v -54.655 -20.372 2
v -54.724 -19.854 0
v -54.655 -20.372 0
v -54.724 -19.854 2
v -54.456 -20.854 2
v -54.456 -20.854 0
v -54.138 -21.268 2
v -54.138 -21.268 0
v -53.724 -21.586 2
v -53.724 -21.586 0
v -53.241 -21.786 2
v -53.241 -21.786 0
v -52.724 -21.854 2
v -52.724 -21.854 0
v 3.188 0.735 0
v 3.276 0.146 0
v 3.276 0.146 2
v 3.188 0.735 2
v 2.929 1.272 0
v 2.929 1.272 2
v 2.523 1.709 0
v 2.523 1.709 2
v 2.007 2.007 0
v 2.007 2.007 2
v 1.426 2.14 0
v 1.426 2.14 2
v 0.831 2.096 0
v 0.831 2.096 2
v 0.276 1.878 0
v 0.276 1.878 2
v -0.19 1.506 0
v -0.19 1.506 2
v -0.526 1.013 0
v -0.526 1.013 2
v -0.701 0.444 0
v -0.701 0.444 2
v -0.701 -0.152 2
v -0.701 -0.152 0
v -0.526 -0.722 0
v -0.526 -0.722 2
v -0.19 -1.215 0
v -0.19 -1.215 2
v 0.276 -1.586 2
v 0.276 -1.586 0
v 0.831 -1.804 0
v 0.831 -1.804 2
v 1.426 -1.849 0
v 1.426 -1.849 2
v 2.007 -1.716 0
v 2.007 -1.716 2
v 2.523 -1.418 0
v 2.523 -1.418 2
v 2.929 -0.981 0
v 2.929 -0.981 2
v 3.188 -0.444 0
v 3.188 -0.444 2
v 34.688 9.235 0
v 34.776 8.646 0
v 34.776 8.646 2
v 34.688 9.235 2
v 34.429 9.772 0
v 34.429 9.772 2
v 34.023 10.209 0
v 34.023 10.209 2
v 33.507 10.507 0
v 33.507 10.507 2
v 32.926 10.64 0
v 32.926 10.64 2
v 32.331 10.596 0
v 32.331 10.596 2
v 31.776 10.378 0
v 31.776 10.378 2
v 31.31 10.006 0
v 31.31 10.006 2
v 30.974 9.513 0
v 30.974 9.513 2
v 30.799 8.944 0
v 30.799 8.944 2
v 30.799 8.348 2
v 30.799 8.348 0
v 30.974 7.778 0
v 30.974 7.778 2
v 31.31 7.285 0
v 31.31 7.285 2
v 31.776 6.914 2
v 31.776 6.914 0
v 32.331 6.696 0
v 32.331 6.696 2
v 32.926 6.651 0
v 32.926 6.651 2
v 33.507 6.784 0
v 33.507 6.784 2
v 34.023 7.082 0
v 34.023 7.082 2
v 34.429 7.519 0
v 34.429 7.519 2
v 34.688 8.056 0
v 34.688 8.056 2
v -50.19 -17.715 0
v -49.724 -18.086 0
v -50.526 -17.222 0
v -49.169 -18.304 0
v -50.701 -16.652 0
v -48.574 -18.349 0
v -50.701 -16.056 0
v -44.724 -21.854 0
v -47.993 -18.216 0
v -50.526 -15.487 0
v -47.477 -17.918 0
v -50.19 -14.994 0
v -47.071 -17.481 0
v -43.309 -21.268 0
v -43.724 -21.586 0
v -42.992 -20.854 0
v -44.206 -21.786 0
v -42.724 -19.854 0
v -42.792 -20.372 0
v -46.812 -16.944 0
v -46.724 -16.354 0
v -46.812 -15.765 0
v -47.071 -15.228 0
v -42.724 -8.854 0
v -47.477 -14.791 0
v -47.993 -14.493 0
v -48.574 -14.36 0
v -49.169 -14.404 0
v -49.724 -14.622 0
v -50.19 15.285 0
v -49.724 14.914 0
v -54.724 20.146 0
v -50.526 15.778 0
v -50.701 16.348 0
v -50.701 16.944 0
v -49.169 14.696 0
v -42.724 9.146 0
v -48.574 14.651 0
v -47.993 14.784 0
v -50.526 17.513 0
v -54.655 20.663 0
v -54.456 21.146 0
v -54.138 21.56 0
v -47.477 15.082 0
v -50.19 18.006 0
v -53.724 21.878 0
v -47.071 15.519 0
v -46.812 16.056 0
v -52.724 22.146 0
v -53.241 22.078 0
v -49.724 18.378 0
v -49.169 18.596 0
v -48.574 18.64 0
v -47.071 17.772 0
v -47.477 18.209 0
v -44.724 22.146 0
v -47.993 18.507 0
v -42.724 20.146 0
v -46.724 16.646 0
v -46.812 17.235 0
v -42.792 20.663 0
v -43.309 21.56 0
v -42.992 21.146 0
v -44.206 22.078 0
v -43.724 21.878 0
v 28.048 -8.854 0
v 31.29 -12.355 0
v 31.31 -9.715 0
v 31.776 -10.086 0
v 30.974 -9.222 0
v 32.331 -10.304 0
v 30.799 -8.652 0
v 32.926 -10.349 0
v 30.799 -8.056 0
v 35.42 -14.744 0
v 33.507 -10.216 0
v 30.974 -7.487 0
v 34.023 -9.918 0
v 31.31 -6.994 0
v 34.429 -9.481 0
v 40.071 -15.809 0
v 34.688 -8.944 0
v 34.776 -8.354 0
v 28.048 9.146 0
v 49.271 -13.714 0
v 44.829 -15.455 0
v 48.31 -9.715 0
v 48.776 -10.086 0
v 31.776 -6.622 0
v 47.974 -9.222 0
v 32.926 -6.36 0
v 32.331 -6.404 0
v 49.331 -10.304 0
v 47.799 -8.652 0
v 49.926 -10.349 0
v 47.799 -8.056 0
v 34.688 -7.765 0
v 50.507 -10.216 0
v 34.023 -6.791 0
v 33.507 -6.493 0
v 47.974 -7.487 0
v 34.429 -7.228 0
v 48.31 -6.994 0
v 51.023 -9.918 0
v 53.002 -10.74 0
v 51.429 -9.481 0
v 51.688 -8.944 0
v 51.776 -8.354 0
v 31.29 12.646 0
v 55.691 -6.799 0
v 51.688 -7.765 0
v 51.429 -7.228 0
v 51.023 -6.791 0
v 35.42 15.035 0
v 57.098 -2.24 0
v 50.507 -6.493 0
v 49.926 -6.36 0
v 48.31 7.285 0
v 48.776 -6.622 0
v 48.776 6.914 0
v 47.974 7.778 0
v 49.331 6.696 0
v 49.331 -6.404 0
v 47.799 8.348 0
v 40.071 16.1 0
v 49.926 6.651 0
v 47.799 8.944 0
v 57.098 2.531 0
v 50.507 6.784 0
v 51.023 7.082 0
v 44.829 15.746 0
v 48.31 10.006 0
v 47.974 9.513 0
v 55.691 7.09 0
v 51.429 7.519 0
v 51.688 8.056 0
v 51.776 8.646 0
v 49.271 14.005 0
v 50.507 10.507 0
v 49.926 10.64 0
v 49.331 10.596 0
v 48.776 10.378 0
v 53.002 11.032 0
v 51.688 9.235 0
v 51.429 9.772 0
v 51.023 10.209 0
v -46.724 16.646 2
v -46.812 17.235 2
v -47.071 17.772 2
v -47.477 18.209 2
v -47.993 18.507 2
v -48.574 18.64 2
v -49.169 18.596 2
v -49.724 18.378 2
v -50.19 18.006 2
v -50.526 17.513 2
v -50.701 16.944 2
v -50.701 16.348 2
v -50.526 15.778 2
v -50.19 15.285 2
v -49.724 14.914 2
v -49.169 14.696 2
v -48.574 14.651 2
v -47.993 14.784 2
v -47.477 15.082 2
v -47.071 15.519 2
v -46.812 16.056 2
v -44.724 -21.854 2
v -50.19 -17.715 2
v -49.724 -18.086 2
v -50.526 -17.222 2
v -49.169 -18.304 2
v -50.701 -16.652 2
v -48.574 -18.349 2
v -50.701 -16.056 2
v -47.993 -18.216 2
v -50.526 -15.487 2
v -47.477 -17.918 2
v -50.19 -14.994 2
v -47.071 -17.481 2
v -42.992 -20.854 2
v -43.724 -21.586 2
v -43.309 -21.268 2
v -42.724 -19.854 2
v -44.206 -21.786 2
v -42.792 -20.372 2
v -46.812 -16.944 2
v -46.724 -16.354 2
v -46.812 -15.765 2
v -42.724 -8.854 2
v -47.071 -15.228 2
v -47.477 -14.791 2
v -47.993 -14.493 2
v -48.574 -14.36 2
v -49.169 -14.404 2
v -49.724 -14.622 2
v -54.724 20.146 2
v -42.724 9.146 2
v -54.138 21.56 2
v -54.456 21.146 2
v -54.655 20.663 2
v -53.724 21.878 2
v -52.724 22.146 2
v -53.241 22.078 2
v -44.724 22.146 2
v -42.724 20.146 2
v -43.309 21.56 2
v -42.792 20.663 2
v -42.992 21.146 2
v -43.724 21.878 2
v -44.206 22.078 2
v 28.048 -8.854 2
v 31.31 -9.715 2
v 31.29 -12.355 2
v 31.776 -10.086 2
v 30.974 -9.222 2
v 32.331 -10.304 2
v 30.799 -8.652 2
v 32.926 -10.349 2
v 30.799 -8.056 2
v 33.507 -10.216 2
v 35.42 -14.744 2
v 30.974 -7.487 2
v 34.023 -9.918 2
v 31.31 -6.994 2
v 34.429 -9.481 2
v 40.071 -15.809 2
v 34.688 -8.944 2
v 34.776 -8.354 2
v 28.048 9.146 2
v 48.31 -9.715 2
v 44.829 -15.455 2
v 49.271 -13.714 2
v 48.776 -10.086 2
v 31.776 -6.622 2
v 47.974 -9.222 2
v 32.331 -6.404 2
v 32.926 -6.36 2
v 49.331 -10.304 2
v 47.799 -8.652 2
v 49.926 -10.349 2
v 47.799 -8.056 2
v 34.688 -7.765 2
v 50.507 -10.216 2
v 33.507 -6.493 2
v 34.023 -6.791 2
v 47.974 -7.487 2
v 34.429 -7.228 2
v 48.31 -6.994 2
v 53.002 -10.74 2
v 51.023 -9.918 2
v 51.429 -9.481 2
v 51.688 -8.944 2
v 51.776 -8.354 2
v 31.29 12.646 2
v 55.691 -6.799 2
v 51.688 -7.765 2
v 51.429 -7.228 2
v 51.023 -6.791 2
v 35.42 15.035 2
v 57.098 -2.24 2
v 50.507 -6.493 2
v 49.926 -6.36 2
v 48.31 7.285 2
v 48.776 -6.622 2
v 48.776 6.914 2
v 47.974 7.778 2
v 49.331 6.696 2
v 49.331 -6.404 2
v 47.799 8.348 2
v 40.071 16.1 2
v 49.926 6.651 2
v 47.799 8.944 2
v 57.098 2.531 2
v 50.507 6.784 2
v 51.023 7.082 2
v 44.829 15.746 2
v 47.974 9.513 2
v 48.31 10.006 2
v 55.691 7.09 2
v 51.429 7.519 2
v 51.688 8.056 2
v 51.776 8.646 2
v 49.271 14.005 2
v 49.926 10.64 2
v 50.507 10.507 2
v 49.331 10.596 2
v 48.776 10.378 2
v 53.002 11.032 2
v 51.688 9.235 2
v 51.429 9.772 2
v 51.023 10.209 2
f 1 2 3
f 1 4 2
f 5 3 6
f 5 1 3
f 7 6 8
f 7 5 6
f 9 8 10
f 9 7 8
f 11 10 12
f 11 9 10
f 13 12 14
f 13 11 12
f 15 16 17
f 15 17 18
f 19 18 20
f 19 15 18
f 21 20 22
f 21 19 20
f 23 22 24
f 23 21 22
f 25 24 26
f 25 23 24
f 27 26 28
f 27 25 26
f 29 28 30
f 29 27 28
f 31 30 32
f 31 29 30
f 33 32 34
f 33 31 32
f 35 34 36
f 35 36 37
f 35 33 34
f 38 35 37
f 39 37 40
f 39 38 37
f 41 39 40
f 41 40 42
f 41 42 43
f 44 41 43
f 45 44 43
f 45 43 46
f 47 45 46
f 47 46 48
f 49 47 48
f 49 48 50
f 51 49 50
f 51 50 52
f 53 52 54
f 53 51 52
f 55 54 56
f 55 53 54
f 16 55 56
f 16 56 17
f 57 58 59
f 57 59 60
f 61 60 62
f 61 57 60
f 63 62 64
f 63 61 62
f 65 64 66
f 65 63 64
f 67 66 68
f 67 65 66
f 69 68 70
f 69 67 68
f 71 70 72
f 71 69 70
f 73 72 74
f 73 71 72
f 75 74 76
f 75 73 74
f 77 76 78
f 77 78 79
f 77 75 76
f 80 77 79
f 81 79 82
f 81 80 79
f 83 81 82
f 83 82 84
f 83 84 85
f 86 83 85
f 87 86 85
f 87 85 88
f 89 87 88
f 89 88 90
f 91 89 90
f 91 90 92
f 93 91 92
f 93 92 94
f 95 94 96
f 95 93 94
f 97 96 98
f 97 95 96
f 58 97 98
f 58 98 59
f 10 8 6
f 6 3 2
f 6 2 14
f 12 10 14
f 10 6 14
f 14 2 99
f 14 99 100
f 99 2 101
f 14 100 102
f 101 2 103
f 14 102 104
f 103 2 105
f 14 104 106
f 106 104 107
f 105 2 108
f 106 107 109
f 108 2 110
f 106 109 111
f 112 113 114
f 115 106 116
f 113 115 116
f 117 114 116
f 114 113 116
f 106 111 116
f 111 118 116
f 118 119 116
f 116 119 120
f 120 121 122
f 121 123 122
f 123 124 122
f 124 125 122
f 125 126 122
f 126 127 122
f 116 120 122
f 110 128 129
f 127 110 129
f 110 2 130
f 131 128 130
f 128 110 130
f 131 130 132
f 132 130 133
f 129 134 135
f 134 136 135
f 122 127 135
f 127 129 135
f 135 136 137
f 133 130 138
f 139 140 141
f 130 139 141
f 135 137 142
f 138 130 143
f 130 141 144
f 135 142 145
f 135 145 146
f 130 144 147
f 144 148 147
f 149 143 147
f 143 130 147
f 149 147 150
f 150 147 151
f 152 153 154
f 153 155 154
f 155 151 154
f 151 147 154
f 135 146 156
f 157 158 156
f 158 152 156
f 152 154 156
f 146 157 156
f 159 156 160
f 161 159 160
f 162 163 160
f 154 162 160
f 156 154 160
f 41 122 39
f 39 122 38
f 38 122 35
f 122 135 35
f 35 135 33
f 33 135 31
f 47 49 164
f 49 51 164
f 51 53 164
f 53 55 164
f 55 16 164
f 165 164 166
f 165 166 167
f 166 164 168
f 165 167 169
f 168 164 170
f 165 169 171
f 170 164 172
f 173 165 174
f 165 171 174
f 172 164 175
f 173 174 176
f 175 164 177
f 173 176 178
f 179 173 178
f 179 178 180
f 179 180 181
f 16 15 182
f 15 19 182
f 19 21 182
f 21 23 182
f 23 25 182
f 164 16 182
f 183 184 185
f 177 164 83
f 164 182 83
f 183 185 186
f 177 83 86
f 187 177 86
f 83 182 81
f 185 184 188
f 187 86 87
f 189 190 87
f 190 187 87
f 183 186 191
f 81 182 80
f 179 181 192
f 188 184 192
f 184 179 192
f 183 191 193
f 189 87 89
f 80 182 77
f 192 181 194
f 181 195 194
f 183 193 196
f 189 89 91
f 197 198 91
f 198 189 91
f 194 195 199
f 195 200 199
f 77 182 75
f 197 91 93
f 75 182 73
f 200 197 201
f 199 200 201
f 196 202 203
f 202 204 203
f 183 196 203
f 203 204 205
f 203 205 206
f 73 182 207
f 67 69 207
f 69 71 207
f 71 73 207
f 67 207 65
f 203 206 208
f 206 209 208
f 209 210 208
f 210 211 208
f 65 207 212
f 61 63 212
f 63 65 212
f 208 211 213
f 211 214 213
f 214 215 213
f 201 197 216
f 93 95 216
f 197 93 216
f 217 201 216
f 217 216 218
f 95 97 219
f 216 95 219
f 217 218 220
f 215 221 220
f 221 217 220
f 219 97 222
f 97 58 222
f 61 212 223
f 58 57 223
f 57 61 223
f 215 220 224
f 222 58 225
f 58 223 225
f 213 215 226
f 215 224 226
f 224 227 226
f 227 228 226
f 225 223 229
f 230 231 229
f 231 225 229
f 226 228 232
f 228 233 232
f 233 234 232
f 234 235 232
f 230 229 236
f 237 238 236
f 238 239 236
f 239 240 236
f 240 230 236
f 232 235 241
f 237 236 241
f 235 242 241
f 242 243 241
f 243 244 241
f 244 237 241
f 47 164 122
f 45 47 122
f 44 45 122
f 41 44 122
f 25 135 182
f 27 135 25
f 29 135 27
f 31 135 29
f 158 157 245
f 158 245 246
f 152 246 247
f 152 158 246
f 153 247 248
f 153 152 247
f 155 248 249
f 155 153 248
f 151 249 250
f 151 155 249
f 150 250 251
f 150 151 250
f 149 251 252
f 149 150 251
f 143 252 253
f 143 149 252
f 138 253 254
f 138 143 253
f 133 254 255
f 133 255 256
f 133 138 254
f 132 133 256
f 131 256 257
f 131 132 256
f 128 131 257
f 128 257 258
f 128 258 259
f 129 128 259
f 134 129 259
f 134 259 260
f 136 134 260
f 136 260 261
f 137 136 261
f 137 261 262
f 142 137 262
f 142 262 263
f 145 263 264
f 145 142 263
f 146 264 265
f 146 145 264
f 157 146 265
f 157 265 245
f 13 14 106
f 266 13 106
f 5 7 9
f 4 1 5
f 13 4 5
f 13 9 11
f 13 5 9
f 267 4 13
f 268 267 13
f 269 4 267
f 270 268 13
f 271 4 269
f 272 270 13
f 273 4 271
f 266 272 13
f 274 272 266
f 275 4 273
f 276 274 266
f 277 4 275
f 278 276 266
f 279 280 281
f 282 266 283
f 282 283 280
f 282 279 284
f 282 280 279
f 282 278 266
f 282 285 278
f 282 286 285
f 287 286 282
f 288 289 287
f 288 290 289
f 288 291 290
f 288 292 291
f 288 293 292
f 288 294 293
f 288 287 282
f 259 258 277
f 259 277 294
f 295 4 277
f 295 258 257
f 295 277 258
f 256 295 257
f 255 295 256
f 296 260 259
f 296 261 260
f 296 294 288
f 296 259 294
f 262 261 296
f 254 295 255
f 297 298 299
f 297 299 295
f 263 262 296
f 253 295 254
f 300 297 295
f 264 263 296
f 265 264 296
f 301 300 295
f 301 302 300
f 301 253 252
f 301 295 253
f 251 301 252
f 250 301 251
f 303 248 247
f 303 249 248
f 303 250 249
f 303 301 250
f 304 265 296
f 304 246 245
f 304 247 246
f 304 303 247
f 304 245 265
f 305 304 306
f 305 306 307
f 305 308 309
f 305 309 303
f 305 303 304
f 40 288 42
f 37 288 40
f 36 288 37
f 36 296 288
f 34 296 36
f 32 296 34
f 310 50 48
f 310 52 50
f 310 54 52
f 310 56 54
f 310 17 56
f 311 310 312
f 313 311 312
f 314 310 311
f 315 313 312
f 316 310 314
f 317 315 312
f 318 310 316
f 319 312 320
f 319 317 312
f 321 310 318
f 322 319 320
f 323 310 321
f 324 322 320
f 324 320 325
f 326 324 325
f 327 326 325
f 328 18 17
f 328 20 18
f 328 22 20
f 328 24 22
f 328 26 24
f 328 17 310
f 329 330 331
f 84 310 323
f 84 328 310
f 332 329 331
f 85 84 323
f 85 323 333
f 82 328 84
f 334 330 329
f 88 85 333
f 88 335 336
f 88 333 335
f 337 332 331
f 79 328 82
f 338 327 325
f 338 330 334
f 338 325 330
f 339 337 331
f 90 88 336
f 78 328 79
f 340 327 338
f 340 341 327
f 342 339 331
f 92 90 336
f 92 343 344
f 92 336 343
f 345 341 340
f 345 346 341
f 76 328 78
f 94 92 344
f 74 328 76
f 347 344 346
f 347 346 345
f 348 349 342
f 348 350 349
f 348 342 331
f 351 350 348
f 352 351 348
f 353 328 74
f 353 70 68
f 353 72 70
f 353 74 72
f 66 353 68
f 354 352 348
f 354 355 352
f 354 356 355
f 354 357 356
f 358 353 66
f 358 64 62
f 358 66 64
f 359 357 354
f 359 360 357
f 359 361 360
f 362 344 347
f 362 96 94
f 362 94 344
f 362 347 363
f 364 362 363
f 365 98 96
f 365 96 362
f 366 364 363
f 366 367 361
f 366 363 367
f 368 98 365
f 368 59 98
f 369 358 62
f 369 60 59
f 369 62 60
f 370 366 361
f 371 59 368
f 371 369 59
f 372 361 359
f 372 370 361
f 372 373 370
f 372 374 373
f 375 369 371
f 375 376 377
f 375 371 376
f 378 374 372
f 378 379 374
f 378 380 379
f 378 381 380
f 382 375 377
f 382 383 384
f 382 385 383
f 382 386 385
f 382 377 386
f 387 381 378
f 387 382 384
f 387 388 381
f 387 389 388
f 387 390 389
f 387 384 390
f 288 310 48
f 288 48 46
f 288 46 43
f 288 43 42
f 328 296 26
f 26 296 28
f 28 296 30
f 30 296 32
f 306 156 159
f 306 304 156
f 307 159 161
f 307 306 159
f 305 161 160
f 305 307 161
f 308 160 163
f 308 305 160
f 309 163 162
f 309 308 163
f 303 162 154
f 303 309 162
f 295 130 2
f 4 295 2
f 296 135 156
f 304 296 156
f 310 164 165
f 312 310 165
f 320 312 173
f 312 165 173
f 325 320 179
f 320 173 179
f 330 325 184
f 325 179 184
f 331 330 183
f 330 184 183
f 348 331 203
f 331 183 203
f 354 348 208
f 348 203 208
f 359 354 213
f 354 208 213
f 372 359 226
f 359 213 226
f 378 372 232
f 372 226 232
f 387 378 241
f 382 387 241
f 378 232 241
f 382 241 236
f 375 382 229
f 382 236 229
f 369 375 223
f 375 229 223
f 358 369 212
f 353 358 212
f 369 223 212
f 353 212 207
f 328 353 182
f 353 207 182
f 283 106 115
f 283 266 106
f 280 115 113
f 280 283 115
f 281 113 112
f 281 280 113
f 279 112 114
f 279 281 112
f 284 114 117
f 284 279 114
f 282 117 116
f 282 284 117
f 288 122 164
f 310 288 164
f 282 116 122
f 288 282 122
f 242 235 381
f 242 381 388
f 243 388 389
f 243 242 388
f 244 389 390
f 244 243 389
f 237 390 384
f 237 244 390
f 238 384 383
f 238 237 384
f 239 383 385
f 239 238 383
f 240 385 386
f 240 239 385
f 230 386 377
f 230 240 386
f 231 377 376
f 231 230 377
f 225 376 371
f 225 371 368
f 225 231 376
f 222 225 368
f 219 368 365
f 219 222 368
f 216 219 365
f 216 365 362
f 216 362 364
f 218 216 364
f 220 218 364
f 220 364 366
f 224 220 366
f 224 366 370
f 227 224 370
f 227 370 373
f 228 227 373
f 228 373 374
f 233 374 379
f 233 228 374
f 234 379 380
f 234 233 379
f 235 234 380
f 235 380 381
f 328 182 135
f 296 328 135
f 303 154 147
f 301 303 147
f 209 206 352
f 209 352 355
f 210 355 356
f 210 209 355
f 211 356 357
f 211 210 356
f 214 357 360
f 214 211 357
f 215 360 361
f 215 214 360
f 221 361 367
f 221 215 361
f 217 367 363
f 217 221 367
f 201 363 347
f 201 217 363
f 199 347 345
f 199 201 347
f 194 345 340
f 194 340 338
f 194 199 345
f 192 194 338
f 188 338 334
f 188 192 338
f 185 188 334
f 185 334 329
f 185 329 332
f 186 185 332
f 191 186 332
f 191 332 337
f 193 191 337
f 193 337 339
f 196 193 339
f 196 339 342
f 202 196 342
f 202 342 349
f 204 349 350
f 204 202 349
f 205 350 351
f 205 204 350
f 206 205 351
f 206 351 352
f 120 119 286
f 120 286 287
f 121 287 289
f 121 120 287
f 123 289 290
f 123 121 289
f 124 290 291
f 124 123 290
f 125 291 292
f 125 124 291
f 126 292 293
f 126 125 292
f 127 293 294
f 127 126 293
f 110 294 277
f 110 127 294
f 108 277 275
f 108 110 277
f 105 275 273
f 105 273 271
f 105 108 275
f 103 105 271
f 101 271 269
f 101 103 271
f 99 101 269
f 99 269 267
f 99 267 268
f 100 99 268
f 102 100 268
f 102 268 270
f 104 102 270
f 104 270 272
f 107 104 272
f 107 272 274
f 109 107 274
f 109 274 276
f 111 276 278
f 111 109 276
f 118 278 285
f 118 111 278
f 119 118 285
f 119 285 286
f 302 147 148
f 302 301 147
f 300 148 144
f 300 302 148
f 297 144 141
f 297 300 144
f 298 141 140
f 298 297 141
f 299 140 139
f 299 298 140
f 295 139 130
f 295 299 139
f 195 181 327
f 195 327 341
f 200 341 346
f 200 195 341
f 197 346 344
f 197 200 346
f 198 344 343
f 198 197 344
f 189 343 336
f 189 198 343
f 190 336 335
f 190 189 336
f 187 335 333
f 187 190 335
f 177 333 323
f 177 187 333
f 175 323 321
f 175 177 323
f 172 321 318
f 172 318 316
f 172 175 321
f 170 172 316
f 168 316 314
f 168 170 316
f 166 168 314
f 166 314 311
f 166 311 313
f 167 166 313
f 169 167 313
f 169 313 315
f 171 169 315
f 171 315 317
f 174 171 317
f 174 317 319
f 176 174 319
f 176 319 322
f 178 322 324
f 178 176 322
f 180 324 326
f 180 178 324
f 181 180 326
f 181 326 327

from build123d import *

# Parameters (mm, degrees)
SKETCH_1_R      = 2
EXTRUDE_1_DEPTH = 2
FILLET_1_R      = 2


with BuildPart() as part:
    # 草图1 → 凸台-拉伸1 (new body)
    with BuildSketch(Plane.XY):
        with BuildLine():
            Line((-42.723571429, 9.145714286), (-42.723571429, 22.145714286))
            Line((-42.723571429, 22.145714286), (-54.723571429, 22.145714286))
            Line((-54.723571429, 22.145714286), (-54.723571429, -21.854285714))
            Line((-54.723571429, -21.854285714), (-42.723571429, -21.854285714))
            Line((-42.723571429, -21.854285714), (-42.723571429, -8.854285714))
            Line((-42.723571429, -8.854285714), (28.047672016, -8.854285714))
            ThreePointArc((28.047672016, -8.854285714), (57.276428571, 0.145714286), (28.047672016, 9.145714286))
            Line((28.047672016, 9.145714286), (-42.723571429, 9.145714286))
        make_face()
        with Locations((1.276428571, 0.145714286)):
            Circle(SKETCH_1_R, mode=Mode.SUBTRACT)
        with Locations((-48.723571429, 16.645714286)):
            Circle(SKETCH_1_R, mode=Mode.SUBTRACT)
        with Locations((-48.723571429, -16.354285714)):
            Circle(SKETCH_1_R, mode=Mode.SUBTRACT)
        with Locations((49.776428571, -8.354285714)):
            Circle(SKETCH_1_R, mode=Mode.SUBTRACT)
        with Locations((32.776428571, -8.354285714)):
            Circle(SKETCH_1_R, mode=Mode.SUBTRACT)
        with Locations((32.776428571, 8.645714286)):
            Circle(SKETCH_1_R, mode=Mode.SUBTRACT)
        with Locations((49.776428571, 8.645714286)):
            Circle(SKETCH_1_R, mode=Mode.SUBTRACT)
    extrude(amount=EXTRUDE_1_DEPTH)

    # 圆角1
    fillet_1_edges = [part.edges().sort_by_distance(p)[0] for p in [
        (-42.723571429, -21.854285714, 1),
        (-54.723571429, -21.854285714, 1),
        (-54.723571429, 22.145714286, 1),
        (-42.723571429, 22.145714286, 1),
    ]]
    fillet(fillet_1_edges, radius=FILLET_1_R)


solid = part.part
